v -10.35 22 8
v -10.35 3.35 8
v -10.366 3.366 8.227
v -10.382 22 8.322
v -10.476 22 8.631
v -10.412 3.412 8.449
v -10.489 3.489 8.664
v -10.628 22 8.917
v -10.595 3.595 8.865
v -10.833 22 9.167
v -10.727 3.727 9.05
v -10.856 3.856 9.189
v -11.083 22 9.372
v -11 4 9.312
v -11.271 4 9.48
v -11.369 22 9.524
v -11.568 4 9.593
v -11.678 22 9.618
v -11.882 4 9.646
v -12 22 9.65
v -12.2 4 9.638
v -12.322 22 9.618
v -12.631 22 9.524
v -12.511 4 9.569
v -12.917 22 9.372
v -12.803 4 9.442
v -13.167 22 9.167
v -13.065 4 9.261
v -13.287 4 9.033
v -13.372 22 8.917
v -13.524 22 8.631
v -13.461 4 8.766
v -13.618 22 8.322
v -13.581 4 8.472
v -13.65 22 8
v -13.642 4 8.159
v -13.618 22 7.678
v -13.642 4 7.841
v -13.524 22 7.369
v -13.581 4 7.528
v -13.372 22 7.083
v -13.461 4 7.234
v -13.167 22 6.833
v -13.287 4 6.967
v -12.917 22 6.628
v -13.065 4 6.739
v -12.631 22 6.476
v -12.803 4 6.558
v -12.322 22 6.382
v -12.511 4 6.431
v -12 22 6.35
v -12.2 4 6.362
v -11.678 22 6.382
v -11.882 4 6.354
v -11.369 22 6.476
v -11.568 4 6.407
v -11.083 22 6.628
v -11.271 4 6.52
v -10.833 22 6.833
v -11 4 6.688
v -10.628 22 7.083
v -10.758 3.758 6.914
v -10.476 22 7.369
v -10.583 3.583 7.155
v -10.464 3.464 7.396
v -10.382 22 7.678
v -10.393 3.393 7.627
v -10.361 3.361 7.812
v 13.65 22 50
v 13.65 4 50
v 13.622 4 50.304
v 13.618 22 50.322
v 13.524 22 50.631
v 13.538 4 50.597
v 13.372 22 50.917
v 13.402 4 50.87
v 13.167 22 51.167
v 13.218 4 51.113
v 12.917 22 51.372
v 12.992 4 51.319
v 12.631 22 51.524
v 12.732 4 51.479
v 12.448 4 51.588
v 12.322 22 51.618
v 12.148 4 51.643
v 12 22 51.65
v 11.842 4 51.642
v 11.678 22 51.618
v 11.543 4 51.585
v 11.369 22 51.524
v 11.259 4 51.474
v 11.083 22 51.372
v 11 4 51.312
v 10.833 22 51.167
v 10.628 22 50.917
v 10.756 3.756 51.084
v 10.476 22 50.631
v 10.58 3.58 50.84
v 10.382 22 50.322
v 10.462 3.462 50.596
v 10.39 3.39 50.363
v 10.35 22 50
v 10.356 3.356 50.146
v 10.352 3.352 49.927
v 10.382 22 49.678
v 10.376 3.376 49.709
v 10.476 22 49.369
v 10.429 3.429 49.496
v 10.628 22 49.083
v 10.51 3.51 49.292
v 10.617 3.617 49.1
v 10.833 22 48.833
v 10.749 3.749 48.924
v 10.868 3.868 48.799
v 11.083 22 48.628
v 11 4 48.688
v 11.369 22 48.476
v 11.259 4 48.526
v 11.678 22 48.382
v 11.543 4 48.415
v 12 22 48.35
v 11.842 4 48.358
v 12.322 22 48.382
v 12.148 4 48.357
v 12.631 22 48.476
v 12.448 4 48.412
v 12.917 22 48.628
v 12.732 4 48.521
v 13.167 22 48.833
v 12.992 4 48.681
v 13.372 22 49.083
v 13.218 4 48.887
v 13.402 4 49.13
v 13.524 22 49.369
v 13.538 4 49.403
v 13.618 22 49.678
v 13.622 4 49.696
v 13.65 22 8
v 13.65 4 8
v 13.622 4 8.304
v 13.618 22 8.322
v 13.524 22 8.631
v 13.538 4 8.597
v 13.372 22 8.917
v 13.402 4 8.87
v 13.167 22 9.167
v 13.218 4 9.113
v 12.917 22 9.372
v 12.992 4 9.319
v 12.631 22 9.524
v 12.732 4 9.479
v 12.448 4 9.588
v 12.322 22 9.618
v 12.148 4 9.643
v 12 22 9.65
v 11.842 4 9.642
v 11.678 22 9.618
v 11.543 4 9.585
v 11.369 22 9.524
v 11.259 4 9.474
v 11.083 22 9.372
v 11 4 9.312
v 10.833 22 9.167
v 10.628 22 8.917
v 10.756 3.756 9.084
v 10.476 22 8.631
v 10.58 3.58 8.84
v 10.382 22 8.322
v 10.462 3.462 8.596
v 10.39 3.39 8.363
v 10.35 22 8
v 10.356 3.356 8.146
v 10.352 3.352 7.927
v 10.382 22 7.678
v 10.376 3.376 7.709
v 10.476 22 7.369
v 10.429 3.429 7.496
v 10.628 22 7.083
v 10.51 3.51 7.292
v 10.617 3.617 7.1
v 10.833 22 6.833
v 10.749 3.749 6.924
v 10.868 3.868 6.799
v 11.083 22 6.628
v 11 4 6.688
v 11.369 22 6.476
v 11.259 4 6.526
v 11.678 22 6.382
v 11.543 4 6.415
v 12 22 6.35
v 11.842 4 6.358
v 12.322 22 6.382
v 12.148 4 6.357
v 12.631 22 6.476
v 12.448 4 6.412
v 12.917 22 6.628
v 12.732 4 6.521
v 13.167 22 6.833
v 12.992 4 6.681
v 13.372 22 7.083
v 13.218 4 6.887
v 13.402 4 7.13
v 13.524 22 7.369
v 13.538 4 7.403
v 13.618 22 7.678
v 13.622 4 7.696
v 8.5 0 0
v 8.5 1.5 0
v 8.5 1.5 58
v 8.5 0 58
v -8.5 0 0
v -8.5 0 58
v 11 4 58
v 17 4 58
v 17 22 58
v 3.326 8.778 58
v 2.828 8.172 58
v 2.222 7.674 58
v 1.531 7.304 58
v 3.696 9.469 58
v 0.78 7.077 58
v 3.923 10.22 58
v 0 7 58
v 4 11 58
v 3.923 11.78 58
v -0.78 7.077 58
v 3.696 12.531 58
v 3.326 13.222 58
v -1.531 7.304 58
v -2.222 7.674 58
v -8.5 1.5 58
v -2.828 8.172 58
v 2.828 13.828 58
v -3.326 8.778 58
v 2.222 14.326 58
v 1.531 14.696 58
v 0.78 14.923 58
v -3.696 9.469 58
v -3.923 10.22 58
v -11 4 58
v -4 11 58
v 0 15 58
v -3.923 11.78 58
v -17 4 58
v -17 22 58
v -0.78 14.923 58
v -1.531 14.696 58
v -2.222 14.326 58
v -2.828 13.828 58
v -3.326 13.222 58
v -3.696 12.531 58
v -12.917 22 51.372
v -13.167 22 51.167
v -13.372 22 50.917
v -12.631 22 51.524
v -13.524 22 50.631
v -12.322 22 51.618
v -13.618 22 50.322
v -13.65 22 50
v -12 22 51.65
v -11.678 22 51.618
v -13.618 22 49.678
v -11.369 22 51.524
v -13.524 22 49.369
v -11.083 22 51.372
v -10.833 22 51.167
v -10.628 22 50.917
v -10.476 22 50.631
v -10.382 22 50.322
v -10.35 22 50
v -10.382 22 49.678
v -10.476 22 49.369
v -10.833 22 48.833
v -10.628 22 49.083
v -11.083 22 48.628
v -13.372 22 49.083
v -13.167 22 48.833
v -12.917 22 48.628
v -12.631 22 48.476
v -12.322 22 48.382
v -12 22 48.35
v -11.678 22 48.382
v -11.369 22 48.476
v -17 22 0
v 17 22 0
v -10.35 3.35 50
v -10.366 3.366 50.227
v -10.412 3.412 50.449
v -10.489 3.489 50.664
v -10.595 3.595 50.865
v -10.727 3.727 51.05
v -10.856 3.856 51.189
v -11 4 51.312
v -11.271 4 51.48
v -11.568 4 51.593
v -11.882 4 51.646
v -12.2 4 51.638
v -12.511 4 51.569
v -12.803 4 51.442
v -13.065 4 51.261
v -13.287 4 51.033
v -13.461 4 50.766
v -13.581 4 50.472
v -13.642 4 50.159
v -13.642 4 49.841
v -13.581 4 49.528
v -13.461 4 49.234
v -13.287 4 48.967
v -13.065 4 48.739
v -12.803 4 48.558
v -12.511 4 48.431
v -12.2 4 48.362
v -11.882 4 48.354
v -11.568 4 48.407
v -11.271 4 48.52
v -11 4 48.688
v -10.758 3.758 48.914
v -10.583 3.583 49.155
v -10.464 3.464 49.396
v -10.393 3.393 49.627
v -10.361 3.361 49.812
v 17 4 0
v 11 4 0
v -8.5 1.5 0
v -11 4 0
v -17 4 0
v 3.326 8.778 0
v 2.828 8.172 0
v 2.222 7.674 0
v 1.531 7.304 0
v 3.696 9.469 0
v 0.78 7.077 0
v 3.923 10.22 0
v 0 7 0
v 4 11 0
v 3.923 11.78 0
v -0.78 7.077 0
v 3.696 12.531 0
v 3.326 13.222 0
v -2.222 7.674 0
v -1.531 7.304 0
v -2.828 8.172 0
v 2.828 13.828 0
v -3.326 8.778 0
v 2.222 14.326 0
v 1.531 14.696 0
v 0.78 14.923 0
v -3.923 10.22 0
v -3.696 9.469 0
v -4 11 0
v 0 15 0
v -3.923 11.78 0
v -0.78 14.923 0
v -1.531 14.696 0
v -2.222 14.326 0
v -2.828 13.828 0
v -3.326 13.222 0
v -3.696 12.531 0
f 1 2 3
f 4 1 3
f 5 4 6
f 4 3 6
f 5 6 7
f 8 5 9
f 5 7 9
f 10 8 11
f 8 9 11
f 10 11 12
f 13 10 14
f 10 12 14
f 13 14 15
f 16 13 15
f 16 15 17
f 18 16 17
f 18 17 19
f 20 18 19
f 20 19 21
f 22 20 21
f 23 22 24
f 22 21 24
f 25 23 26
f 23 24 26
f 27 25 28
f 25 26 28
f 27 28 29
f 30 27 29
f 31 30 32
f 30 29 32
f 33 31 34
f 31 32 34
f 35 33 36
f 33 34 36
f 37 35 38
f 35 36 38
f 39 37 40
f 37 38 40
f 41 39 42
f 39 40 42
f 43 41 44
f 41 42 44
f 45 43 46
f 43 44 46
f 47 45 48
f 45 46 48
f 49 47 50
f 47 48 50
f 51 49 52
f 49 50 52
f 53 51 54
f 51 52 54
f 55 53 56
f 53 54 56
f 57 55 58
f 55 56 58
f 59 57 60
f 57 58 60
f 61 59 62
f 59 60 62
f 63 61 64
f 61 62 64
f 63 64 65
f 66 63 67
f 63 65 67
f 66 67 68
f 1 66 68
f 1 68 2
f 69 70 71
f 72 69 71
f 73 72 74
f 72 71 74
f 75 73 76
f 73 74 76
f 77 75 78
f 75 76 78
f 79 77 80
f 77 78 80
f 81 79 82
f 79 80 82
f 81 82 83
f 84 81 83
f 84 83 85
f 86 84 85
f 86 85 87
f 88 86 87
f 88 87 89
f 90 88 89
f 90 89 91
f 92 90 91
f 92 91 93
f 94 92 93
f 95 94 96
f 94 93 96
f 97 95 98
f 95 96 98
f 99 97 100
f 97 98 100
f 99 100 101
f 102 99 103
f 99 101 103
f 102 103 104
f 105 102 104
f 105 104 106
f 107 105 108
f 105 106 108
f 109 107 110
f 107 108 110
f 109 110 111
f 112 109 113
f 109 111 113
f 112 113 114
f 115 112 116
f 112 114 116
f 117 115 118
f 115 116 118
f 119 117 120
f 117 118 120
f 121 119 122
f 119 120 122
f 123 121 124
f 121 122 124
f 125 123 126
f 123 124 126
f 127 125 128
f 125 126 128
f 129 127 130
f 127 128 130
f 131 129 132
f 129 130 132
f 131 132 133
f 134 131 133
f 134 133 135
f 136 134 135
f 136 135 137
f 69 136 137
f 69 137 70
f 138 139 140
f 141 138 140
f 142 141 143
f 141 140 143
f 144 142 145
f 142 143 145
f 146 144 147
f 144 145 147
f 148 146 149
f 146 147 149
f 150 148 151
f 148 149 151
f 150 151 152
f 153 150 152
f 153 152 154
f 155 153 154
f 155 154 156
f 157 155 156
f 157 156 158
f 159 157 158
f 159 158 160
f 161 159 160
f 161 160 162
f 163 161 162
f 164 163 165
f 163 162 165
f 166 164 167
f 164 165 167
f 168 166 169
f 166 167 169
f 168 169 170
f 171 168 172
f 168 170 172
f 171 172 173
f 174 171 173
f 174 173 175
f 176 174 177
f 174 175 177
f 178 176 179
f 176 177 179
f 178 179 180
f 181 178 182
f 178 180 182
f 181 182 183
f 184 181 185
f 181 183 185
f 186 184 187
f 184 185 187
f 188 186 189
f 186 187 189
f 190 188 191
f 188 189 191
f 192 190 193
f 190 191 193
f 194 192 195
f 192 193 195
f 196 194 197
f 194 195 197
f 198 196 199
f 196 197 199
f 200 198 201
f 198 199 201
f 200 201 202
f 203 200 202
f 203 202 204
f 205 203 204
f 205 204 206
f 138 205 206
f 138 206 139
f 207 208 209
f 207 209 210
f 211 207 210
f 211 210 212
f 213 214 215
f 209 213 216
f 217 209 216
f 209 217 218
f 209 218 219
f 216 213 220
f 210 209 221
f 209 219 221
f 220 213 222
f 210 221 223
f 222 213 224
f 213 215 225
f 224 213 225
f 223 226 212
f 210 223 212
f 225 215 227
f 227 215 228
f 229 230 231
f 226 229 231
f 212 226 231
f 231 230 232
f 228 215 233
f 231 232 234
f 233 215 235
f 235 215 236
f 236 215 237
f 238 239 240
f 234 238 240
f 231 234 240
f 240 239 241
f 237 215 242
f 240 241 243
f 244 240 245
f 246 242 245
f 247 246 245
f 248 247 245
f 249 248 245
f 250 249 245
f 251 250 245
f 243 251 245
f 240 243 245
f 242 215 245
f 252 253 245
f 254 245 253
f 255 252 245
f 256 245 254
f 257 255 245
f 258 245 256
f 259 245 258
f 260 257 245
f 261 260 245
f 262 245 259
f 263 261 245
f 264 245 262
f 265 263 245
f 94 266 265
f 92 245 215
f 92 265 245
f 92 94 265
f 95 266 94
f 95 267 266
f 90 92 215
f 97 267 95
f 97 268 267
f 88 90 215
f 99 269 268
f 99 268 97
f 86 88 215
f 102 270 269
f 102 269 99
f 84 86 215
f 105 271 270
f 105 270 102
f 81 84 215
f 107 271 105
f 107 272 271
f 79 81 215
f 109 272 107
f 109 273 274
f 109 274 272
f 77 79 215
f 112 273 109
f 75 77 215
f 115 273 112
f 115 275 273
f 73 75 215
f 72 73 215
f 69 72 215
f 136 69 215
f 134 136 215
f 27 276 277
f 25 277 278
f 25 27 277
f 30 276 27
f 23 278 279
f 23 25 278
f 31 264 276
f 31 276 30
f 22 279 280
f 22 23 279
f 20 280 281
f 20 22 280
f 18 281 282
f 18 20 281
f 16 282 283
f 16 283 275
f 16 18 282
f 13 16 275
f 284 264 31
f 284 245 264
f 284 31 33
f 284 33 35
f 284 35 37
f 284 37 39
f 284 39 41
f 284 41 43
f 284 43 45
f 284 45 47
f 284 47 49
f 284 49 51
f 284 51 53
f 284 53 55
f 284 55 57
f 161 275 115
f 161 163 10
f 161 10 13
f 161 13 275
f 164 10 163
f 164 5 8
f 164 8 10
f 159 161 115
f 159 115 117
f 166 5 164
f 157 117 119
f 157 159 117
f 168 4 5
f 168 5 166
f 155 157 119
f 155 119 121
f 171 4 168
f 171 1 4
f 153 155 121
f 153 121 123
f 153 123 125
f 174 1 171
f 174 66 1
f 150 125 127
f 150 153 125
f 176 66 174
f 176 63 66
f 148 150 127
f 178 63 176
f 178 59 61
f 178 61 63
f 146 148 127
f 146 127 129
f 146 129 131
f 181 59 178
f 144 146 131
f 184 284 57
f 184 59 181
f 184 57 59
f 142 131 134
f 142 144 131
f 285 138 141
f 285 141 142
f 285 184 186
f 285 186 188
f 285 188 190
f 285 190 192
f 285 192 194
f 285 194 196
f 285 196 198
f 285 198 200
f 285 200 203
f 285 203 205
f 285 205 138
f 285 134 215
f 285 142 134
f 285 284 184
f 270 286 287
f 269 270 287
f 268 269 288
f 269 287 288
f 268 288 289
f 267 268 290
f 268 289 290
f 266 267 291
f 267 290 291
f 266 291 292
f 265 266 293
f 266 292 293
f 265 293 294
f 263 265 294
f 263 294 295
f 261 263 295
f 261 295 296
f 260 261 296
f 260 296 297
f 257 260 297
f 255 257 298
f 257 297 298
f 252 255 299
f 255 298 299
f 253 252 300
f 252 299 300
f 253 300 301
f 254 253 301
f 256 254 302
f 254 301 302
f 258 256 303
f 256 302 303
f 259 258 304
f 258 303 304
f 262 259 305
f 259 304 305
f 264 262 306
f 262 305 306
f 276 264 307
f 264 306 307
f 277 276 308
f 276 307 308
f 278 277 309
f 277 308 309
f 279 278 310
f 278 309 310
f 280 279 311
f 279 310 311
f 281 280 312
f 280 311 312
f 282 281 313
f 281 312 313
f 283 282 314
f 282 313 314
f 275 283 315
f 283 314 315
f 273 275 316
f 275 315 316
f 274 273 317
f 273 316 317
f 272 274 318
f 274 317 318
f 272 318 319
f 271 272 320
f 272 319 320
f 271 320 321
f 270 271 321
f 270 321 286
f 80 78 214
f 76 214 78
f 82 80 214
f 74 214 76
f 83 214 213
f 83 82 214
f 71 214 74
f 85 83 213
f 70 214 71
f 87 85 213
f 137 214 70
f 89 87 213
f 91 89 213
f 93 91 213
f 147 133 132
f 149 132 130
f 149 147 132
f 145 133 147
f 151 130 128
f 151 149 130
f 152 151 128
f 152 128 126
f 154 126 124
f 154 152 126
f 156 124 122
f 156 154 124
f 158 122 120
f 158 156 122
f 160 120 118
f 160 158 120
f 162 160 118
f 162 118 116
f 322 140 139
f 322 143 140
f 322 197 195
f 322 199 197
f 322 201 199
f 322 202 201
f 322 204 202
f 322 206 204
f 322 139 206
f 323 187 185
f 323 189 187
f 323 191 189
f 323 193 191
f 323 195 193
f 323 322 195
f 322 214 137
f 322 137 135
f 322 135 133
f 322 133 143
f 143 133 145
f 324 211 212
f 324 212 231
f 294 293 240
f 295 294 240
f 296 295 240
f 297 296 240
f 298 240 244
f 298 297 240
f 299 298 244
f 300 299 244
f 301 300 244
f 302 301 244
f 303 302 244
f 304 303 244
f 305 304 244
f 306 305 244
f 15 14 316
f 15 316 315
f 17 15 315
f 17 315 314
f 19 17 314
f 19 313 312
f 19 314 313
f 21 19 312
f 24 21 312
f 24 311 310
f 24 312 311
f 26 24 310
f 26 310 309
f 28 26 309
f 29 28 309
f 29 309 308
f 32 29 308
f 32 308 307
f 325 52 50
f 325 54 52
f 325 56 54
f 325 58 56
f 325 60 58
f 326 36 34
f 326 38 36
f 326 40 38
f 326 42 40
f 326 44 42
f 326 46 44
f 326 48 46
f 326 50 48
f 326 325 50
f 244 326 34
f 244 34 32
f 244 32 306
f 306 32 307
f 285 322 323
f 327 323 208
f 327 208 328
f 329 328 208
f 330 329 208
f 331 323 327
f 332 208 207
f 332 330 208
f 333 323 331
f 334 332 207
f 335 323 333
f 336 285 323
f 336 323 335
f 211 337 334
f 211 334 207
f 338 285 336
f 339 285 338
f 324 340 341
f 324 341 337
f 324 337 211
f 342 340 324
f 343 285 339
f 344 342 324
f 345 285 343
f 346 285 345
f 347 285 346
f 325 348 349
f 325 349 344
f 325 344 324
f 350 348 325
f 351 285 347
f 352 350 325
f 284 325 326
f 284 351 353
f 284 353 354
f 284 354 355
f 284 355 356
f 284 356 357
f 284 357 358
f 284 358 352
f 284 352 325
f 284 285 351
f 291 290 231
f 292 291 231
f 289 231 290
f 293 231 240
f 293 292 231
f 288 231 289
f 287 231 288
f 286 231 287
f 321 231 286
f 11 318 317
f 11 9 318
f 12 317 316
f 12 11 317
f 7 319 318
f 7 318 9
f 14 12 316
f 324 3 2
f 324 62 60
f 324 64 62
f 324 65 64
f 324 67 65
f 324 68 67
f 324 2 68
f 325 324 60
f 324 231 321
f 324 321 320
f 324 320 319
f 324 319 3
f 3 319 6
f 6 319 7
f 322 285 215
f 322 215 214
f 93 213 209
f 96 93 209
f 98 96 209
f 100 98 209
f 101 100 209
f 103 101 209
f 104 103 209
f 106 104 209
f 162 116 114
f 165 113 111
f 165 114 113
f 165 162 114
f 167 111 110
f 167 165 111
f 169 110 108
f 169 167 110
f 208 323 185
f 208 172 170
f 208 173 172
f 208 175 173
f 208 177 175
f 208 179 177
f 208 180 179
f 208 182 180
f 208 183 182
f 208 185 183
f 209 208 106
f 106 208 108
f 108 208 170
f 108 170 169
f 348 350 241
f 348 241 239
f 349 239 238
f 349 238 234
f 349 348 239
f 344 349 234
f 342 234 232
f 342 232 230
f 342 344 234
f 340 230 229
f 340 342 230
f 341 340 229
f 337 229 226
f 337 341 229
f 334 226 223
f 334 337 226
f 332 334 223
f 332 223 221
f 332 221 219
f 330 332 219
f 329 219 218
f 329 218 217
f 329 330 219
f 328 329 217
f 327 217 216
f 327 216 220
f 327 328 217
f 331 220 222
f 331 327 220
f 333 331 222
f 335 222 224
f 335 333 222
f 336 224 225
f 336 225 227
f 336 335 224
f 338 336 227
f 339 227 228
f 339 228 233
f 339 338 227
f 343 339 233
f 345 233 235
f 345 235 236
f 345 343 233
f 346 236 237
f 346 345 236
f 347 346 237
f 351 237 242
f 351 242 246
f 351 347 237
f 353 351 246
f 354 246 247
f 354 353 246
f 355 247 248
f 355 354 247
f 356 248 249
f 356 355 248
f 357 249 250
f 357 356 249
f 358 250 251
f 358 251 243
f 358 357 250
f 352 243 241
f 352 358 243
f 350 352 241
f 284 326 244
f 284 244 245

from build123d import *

# Parameters (mm, degrees)
SKETCH_1_R         = 4
EXTRUDE_1_DEPTH    = 58
HOLE_WIZARD_M4_1_D = 3.3


with BuildPart() as part:
    # 草图1 → 凸台-拉伸1 (new body)
    with BuildSketch(Plane.XY):
        Polygon((8.5, 0), (-8.5, 0), (-8.5, 1.5), (-11, 4), (-17, 4), (-17, 22), (17, 22), (17, 4), (11, 4), (8.5, 1.5), align=None)
        with Locations(Location((0, 11, 0), (0, 0, 180))):
            Circle(SKETCH_1_R, mode=Mode.SUBTRACT)
    extrude(amount=EXTRUDE_1_DEPTH)

    # M4 螺纹孔1 (through all)
    with Locations(Plane(origin=(0, 22, 0), x_dir=(-1, 0, 0), z_dir=(0, 1, 0))):
        with Locations((12, 50), (-12, 50), (-12, 8), (12, 8)):
            Hole(HOLE_WIZARD_M4_1_D / 2)


solid = part.part
